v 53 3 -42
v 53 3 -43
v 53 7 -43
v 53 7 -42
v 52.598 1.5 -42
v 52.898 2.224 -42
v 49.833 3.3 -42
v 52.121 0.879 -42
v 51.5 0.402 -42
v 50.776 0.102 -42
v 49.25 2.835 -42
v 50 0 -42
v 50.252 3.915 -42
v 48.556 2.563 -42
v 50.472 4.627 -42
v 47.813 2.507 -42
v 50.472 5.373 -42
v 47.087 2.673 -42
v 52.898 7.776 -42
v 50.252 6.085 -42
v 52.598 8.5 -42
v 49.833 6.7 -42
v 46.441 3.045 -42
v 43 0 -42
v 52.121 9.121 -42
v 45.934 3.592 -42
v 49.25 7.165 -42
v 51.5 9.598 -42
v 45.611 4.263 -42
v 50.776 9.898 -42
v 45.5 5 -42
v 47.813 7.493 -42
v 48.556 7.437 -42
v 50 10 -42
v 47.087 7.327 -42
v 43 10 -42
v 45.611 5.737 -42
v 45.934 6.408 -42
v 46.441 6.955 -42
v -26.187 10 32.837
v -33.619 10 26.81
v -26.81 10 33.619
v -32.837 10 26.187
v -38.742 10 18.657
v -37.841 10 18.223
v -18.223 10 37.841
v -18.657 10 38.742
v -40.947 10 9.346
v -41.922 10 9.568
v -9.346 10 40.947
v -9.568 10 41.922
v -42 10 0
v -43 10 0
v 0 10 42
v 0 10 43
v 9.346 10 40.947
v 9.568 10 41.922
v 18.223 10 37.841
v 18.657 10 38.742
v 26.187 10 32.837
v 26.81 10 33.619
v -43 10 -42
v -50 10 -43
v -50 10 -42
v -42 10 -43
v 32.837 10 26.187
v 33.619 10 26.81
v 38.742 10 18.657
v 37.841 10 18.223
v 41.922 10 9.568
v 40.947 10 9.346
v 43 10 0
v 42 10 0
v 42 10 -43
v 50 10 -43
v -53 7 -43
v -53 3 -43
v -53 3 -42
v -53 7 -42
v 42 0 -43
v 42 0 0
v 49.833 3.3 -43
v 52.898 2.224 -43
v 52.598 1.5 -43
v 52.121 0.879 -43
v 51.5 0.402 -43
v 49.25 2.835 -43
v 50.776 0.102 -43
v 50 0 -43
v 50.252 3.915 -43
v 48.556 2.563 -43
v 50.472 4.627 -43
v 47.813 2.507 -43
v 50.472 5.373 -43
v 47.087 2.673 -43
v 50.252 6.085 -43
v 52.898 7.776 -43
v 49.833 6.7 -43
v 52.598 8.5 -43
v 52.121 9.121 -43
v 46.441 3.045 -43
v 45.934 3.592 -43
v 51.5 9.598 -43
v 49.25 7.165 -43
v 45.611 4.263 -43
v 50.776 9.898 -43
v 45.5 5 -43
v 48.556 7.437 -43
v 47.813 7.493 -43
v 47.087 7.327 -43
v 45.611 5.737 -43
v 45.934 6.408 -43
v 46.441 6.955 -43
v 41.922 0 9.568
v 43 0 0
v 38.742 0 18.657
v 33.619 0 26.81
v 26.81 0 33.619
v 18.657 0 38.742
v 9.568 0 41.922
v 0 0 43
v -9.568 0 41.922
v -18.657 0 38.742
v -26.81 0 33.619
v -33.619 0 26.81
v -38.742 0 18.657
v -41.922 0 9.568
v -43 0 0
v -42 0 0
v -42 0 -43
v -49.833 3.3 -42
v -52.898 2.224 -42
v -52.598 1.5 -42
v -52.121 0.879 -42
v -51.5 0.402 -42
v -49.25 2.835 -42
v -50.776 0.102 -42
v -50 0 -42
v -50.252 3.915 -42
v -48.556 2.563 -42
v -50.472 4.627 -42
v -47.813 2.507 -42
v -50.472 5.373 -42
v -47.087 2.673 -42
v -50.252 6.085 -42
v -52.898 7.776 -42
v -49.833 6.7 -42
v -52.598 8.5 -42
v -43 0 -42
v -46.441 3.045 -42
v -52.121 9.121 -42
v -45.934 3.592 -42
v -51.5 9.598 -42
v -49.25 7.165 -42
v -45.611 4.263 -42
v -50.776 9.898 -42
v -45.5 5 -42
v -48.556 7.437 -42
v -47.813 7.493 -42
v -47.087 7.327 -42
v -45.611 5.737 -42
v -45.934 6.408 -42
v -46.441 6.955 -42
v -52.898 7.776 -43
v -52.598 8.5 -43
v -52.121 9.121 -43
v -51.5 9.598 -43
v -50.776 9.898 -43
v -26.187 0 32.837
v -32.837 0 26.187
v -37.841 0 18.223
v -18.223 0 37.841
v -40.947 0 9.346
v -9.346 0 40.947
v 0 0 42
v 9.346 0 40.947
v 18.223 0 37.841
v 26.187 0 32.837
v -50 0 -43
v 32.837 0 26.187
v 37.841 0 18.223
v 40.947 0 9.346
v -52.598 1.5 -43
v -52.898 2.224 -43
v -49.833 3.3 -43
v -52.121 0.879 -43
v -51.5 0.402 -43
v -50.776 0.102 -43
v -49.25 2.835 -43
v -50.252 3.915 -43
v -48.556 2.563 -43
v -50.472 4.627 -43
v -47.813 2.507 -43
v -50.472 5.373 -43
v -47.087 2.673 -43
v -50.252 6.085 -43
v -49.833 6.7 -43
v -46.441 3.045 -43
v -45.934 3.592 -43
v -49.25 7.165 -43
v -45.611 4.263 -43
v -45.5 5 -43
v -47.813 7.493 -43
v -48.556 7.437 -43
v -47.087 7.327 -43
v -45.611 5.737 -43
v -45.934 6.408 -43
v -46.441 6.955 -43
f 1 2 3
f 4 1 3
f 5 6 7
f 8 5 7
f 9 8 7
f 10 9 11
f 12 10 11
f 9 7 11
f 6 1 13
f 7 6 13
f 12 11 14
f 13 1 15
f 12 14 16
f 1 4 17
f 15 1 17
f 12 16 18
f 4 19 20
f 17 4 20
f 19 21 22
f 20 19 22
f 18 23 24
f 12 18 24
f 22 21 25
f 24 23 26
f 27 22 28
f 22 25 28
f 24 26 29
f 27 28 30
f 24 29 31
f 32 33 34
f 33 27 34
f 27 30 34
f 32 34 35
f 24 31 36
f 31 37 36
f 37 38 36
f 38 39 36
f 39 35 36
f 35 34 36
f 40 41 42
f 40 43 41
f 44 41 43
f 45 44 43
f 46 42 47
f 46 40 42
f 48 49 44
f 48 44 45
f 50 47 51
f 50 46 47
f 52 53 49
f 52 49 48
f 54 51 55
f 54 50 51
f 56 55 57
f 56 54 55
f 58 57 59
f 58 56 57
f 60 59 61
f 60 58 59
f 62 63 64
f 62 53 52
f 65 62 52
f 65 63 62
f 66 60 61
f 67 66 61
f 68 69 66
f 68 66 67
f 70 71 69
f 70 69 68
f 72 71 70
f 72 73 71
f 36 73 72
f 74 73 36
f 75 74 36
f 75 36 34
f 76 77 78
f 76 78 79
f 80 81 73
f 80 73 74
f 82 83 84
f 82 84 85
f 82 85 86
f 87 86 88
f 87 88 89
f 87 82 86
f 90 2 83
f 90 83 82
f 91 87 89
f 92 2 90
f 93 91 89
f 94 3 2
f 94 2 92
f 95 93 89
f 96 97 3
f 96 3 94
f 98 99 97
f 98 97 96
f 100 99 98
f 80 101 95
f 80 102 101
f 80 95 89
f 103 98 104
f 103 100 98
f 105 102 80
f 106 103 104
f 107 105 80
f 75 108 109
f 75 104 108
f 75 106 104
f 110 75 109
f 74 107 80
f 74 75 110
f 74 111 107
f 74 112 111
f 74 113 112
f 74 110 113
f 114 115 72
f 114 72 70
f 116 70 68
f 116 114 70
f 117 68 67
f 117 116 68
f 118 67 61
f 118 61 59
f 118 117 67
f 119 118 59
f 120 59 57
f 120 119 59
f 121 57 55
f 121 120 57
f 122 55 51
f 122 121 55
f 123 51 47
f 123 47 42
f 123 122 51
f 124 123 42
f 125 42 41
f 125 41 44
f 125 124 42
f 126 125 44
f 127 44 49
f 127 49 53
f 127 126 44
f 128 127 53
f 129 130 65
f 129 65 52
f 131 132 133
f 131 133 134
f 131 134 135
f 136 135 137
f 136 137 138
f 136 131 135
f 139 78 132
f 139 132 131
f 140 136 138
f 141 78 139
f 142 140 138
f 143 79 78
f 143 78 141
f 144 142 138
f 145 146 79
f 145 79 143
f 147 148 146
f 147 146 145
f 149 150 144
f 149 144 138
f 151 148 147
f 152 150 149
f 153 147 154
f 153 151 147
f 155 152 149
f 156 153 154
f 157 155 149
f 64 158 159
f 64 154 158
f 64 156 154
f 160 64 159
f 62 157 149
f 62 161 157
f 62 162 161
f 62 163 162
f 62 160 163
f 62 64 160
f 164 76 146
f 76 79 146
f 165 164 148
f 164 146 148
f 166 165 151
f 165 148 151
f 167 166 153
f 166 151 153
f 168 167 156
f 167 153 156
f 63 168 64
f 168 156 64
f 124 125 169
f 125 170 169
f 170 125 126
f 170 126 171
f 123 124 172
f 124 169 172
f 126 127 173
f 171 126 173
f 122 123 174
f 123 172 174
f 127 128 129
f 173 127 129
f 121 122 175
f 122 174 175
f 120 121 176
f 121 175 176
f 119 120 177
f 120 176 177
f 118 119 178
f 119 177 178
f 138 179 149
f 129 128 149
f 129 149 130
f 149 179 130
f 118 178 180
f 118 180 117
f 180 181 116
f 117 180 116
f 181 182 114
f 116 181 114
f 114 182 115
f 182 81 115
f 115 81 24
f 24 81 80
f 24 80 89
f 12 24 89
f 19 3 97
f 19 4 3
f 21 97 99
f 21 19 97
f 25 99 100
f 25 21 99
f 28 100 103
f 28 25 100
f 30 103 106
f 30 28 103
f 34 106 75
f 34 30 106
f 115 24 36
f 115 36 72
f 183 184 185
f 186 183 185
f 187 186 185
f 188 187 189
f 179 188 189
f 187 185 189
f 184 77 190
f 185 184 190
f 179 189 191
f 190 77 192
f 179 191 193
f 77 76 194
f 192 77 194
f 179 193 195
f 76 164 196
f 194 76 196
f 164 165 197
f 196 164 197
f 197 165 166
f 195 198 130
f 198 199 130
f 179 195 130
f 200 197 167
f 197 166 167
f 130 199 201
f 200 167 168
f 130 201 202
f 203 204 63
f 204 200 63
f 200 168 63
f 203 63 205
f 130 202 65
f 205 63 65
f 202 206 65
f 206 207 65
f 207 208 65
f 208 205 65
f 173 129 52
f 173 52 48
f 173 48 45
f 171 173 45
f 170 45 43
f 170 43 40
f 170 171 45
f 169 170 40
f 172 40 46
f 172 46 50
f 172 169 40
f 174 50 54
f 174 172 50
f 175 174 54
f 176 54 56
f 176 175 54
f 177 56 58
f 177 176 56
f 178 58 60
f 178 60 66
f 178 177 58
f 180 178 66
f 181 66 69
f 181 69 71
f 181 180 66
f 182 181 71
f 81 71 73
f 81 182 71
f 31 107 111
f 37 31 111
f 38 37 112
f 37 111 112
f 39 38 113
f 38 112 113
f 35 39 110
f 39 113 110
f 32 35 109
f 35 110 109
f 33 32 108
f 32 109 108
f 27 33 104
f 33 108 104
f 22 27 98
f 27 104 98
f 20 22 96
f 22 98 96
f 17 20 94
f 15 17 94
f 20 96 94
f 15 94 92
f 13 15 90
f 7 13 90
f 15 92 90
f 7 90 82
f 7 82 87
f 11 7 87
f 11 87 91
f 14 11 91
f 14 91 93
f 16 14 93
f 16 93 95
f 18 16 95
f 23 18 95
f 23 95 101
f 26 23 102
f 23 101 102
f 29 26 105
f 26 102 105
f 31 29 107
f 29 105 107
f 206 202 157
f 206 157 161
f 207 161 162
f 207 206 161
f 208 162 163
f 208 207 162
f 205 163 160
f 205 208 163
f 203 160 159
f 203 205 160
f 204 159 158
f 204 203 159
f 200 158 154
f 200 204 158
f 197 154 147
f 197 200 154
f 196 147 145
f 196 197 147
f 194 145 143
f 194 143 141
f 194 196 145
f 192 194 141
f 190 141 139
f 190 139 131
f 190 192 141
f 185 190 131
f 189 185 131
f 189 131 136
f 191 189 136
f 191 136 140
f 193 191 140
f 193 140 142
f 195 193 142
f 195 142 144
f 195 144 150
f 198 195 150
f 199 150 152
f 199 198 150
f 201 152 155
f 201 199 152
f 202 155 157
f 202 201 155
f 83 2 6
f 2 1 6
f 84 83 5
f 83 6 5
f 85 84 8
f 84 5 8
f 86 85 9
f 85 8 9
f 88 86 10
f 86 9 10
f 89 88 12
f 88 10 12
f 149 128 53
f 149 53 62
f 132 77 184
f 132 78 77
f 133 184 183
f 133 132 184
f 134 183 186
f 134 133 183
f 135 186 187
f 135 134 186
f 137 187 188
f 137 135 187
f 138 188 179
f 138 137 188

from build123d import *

# Parameters (mm, degrees)
DODANIE_WYCI_GNI_CIE1_DEPTH = 10
SZKIC3_W                    = 10
SZKIC3_H                    = 10
DODANIE_WYCI_GNI_CIE2_DEPTH = 1
ZAOKR_GLENIE1_R             = 3
ZAOKR_GLENIE2_R             = 3
SZKIC5_R                    = 2.5
WYTNIJ_WYCI_GNI_CIE1_DEPTH  = 1
ZAOKR_GLENIE1_OF_LUSTRO1_R  = 3
ZAOKR_GLENIE2_OF_LUSTRO1_R  = 3


with BuildPart() as part:
    # Szkic2 → Dodanie-wyciągnięcie1 (new body)
    with BuildSketch(Plane(origin=(0, 0, 0), x_dir=(1, 0, 0), z_dir=(0, 1, 0))):
        with BuildLine():
            Line((-43, 43), (-42, 43))
            Line((-42, 43), (-42, 0))
            ThreePointArc((-42, 0), (0, -42), (42, 0))
            Line((42, 0), (42, 43))
            Line((42, 43), (43, 43))
            Line((43, 43), (43, 0))
            ThreePointArc((43, 0), (0, -43), (-43, 0))
            Line((-43, 0), (-43, 43))
        make_face()
    extrude(amount=DODANIE_WYCI_GNI_CIE1_DEPTH)

    # Szkic3 → Dodanie-wyciągnięcie2 (add)
    with BuildSketch(Plane(origin=(0, 0, -43), x_dir=(-1, 0, 0), z_dir=(0, 0, -1))):
        with Locations((-48, 5)):
            Rectangle(SZKIC3_W, SZKIC3_H)
    dodanie_wyci_gni_cie2 = extrude(amount=-DODANIE_WYCI_GNI_CIE2_DEPTH)

    # Zaokrąglenie1
    zaokr_glenie1_edges = [part.edges().sort_by_distance(p)[0] for p in [
        (53, 10, -42.5),
    ]]
    fillet(zaokr_glenie1_edges, radius=ZAOKR_GLENIE1_R)

    # Zaokrąglenie2
    zaokr_glenie2_edges = [part.edges().sort_by_distance(p)[0] for p in [
        (53, 0, -42.5),
    ]]
    fillet(zaokr_glenie2_edges, radius=ZAOKR_GLENIE2_R)

    # Szkic5 → Wytnij-wyciągnięcie1 (cut)
    with BuildSketch(Plane(origin=(0, 0, -43), x_dir=(-1, 0, 0), z_dir=(0, 0, -1))):
        with Locations((-48, 5)):
            Circle(SZKIC5_R)
    wytnij_wyci_gni_cie1 = extrude(amount=-WYTNIJ_WYCI_GNI_CIE1_DEPTH, mode=Mode.SUBTRACT)

    # Lustro1: Dodanie-wyciągnięcie2, Wytnij-wyciągnięcie1 across plane
    add(dodanie_wyci_gni_cie2.mirror(Plane(origin=(0, 0, 0), x_dir=(0, 0, 1), z_dir=(1, 0, 0))))
    add(wytnij_wyci_gni_cie1.mirror(Plane(origin=(0, 0, 0), x_dir=(0, 0, 1), z_dir=(1, 0, 0))), mode=Mode.SUBTRACT)

    # Zaokrąglenie1 of Lustro1
    zaokr_glenie1_of_lustro1_edges = [part.edges().sort_by_distance(p)[0] for p in [
        (-53, 10, -42.5),
    ]]
    fillet(zaokr_glenie1_of_lustro1_edges, radius=ZAOKR_GLENIE1_OF_LUSTRO1_R)

    # Zaokrąglenie2 of Lustro1
    zaokr_glenie2_of_lustro1_edges = [part.edges().sort_by_distance(p)[0] for p in [
        (-53, 0, -42.5),
    ]]
    fillet(zaokr_glenie2_of_lustro1_edges, radius=ZAOKR_GLENIE2_OF_LUSTRO1_R)


solid = part.part
